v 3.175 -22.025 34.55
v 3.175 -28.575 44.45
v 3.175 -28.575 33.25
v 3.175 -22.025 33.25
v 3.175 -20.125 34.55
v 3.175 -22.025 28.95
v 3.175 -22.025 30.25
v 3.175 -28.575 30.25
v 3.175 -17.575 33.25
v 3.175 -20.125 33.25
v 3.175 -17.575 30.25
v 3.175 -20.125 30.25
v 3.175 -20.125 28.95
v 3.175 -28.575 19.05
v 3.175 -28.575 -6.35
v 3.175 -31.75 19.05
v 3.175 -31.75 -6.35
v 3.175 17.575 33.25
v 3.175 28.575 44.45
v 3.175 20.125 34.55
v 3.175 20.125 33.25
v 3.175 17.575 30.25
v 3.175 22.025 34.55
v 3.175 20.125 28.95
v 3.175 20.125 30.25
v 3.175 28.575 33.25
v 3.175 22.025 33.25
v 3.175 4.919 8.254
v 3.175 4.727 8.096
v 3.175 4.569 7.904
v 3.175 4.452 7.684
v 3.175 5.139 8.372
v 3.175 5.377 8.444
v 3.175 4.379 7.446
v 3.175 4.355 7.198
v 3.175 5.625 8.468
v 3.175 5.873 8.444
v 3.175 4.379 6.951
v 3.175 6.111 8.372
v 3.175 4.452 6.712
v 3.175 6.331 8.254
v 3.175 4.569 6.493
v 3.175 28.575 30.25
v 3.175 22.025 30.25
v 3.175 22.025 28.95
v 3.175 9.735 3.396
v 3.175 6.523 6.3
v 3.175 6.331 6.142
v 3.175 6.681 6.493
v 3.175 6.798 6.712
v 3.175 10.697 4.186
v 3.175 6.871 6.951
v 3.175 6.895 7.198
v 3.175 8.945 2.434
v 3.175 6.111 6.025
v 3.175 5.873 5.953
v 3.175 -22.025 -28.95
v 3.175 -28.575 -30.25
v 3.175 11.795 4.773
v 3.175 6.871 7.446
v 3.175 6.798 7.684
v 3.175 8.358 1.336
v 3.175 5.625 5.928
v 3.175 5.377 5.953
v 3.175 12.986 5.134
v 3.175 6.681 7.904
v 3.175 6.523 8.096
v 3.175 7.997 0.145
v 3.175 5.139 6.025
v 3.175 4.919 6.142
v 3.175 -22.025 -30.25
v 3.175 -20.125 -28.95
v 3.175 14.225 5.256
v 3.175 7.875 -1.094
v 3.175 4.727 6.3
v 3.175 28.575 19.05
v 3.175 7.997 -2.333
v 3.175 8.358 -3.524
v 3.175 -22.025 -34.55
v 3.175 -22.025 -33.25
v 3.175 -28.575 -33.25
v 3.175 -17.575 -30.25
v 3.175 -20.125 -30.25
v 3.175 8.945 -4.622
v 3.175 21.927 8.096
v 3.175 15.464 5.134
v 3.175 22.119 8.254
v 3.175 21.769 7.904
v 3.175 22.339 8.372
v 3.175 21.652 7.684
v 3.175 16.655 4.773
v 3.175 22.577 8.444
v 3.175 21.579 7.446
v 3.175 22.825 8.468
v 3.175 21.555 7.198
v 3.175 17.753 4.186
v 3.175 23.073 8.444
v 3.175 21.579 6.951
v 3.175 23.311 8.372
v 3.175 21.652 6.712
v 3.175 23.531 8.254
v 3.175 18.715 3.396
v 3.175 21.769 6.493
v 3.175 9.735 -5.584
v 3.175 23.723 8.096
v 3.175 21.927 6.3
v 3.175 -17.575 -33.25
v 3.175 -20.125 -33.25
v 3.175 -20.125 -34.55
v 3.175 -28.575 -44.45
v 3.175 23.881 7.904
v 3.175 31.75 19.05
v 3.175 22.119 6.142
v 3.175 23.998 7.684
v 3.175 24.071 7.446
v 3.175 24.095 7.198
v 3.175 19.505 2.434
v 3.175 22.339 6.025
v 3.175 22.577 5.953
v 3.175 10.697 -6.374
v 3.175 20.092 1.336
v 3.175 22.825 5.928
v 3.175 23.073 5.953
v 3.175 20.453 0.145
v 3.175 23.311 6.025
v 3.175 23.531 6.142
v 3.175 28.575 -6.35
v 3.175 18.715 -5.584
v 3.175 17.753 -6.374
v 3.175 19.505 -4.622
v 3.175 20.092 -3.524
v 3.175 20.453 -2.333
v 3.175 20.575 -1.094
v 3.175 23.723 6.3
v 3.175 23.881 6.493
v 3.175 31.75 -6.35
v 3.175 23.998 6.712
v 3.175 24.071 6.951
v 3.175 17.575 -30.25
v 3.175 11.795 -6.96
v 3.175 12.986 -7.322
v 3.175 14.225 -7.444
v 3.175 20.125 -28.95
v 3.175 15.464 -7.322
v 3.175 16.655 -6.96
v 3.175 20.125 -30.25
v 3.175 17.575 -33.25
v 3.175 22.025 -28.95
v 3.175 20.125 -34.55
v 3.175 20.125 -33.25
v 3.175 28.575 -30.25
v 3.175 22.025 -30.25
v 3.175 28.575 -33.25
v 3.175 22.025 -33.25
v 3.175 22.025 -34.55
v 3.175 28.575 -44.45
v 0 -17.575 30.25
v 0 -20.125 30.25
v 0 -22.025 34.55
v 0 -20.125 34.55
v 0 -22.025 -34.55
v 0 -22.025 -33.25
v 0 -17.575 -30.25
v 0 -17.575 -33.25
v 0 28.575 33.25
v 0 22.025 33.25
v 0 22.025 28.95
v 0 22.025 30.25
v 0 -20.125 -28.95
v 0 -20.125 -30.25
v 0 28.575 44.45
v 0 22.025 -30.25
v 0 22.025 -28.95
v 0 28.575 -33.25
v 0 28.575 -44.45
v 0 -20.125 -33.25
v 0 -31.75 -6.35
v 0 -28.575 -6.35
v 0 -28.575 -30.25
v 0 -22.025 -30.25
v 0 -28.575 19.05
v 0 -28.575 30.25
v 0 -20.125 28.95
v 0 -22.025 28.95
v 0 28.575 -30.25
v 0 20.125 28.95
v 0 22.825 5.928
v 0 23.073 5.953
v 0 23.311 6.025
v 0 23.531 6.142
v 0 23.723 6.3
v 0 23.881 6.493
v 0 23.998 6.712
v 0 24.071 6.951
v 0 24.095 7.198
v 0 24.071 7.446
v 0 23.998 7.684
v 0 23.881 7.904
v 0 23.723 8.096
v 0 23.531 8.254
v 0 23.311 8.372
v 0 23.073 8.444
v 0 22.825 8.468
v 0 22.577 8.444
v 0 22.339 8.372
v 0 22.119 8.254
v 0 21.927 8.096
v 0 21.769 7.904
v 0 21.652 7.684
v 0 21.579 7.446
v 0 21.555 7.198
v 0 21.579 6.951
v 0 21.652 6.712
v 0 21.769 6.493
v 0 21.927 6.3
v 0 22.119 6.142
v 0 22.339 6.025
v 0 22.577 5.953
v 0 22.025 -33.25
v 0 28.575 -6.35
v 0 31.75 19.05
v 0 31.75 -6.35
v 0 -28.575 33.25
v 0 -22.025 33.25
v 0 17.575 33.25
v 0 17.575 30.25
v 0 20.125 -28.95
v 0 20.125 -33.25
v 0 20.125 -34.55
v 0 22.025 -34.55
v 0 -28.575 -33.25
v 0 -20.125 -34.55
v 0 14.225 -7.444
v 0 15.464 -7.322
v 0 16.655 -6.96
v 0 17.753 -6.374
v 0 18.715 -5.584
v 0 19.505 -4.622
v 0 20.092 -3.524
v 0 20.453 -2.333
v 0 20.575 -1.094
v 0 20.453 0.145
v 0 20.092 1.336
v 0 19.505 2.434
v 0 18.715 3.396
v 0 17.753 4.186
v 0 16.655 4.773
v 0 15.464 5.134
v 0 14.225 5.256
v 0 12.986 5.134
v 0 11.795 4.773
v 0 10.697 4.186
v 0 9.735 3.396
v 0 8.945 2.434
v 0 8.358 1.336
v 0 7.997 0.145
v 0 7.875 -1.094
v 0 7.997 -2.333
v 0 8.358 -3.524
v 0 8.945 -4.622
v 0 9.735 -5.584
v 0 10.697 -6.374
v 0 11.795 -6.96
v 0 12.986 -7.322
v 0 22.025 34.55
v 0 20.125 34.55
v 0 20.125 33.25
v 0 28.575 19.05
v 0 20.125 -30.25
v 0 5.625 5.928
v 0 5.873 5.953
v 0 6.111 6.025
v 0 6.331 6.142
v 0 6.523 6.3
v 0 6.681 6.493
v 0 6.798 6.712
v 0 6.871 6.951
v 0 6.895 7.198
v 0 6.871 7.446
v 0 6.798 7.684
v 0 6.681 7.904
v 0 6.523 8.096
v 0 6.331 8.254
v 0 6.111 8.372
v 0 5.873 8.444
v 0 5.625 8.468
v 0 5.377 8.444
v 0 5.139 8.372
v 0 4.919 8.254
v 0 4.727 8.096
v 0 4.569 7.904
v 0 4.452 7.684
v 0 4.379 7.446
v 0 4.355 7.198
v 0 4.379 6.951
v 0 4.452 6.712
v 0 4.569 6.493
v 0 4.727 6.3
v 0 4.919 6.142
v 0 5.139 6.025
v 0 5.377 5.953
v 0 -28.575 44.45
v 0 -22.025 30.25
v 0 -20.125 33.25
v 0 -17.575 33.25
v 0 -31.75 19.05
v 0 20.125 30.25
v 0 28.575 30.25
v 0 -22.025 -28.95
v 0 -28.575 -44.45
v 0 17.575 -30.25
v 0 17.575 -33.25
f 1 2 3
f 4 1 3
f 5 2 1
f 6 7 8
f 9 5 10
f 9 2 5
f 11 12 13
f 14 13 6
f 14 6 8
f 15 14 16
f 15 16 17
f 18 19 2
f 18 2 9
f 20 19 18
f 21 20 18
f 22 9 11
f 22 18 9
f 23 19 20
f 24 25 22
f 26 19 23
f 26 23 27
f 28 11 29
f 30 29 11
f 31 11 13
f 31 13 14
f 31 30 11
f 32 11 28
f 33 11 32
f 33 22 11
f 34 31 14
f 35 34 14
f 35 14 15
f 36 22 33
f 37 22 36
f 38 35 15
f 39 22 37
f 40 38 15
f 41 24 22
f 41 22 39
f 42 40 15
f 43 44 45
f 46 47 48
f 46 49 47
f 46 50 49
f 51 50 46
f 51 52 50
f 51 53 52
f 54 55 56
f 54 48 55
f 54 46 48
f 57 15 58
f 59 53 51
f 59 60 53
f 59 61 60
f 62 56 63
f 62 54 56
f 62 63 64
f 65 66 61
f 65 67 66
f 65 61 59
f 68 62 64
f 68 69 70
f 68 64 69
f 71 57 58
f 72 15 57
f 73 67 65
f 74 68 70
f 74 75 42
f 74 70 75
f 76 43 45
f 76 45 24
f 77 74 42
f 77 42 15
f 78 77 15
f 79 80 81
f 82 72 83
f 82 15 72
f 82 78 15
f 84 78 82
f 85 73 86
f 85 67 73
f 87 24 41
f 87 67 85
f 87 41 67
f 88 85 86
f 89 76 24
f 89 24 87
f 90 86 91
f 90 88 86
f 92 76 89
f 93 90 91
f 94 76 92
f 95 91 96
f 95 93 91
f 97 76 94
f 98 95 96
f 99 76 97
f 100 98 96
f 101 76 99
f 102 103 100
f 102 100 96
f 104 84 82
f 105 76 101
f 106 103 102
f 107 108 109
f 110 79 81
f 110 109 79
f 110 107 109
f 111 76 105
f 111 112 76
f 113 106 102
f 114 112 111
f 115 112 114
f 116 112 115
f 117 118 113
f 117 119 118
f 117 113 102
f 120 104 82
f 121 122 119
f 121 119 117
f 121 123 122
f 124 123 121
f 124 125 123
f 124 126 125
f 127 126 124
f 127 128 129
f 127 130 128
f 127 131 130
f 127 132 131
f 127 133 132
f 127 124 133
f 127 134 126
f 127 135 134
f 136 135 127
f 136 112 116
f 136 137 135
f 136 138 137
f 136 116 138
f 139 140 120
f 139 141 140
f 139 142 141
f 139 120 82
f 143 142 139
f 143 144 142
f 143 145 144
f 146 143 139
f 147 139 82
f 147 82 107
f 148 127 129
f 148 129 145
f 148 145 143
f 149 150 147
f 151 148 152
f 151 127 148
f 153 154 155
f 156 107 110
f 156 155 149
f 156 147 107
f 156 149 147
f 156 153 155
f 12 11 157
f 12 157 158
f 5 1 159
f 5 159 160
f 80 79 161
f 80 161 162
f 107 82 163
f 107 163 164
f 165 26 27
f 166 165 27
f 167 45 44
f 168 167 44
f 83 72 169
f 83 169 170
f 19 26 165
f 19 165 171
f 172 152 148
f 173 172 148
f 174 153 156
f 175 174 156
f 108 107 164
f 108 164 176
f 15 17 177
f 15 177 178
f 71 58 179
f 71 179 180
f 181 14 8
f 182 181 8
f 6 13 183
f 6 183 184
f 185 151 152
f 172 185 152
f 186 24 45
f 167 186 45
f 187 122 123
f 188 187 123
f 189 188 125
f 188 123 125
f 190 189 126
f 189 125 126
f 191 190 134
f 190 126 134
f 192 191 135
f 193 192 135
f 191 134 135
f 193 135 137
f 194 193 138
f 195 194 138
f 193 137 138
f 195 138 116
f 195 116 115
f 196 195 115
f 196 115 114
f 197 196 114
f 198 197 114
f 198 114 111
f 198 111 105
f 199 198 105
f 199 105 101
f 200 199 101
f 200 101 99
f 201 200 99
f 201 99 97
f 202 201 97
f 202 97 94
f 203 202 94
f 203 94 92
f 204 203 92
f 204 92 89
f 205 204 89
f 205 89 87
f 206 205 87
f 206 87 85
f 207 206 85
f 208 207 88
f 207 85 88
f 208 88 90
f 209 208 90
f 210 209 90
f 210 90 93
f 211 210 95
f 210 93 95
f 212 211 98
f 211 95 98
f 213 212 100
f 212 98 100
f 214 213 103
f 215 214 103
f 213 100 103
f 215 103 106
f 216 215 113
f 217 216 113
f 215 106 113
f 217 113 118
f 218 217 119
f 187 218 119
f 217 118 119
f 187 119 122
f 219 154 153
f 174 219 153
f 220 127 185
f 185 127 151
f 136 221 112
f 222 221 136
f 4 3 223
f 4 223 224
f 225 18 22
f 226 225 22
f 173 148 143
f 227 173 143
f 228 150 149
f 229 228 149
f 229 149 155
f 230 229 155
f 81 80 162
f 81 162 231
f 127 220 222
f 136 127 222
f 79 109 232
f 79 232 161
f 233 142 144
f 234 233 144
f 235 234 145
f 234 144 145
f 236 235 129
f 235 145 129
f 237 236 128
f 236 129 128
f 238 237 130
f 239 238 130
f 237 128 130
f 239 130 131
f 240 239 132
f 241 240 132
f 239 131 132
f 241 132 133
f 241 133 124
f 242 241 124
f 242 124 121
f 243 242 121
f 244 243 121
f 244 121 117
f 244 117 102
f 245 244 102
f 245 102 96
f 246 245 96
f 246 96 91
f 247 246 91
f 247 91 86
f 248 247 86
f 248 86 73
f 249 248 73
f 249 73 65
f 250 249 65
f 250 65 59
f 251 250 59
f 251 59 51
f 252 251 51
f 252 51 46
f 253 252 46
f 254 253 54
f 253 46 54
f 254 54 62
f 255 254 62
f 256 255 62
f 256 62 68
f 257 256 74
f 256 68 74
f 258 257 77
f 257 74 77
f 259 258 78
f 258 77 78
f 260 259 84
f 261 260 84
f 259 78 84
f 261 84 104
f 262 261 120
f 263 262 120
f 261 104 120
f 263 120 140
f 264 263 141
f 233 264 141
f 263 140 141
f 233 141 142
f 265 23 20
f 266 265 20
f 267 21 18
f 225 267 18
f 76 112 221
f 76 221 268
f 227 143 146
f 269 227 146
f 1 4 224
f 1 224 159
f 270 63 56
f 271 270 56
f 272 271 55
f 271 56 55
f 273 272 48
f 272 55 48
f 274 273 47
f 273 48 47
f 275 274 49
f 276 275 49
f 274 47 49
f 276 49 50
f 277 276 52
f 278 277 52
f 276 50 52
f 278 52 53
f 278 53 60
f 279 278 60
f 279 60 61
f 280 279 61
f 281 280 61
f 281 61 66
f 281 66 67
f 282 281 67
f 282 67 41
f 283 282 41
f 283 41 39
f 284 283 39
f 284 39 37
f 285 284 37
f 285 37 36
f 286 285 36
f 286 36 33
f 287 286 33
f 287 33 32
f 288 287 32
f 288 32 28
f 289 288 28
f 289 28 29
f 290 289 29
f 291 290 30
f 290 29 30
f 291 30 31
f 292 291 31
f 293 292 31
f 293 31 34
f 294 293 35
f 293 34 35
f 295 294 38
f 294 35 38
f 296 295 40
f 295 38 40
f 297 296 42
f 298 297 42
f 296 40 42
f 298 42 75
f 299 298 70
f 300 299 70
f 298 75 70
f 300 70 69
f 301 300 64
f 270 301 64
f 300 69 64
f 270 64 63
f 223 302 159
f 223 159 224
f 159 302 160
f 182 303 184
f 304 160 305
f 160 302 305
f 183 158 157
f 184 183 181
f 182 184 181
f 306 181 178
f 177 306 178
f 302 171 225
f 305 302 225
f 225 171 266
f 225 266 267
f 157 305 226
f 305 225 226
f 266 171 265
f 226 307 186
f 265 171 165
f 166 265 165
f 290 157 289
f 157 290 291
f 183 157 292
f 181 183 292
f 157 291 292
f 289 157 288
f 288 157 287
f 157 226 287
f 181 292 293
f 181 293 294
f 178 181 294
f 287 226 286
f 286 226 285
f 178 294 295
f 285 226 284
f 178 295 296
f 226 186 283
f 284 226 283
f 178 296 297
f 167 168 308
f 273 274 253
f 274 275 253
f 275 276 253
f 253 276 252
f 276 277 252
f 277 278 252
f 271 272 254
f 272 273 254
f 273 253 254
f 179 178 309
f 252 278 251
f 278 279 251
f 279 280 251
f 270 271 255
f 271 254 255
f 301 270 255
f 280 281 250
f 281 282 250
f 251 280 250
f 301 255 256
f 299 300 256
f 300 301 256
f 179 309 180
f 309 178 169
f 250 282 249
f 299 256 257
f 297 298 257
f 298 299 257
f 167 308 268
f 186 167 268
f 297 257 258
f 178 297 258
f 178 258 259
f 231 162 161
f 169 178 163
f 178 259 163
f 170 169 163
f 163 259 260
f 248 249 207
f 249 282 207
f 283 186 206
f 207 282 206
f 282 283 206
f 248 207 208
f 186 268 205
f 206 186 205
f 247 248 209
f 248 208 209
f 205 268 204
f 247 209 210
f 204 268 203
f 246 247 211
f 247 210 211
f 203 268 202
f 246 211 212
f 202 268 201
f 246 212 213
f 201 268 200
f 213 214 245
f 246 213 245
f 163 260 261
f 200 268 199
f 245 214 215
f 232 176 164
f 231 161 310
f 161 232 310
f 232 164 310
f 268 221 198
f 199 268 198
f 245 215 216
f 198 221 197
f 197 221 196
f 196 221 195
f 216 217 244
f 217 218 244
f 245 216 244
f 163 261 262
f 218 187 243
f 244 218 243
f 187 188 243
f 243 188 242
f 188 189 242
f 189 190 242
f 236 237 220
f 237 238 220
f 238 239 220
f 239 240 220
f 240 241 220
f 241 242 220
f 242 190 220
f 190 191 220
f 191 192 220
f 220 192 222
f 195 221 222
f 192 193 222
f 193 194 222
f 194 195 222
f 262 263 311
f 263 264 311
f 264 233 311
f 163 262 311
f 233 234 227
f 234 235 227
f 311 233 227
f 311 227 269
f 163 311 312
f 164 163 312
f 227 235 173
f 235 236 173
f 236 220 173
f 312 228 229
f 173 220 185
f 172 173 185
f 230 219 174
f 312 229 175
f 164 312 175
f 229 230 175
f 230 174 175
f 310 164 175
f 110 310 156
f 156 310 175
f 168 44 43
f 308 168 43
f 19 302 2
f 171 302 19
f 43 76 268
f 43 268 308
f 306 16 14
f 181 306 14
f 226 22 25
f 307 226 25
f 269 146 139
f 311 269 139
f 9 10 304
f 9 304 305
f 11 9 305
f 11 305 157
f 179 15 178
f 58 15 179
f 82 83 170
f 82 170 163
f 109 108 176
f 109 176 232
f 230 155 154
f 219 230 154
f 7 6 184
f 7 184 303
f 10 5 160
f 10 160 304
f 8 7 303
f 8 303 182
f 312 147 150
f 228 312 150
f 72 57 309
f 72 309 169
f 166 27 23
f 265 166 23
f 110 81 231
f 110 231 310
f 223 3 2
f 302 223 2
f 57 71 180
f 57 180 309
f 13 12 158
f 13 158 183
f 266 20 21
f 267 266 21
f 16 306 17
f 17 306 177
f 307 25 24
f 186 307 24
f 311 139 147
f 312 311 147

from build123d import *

# Parameters (mm, degrees)
SKETCH1_W           = 88.9
SKETCH1_H           = 63.5
BOSS_EXTRUDE1_DEPTH = 3.175
SKETCH2_W           = 38.1
SKETCH2_H           = 3.175
CUT_EXTRUDE1_DEPTH  = 55.716959208
CUT_EXTRUDE2_DEPTH  = 55.716959208
SKETCH4_R           = 6.35
SKETCH4_R_2         = 1.27
CUT_EXTRUDE3_DEPTH  = 55.716959208


with BuildPart() as part:
    # Sketch1 → Boss-Extrude1 (new body)
    with BuildSketch(Plane(origin=(0, 0, 0), x_dir=(0, 0, -1), z_dir=(1, 0, 0))):
        Rectangle(SKETCH1_W, SKETCH1_H)
    extrude(amount=BOSS_EXTRUDE1_DEPTH)

    # Sketch2 → Cut-Extrude1 (cut, through all)
    with BuildSketch(Plane(origin=(3.175, 0, 0), x_dir=(0, 0, -1), z_dir=(1, 0, 0))):
        with Locations((25.4, -30.1625)):
            Rectangle(SKETCH2_W, SKETCH2_H)
        Polygon((-19.05, 28.575), (-44.45, 28.575), (-44.45, 31.75), (-41.275, 31.75), (-19.05, 31.75), align=None)
        Polygon((-44.45, -31.75), (-41.275, -31.75), (-19.05, -31.75), (-19.05, -28.575), (-44.45, -28.575), align=None)
        with Locations((25.4, 30.1625)):
            Rectangle(SKETCH2_W, SKETCH2_H)
    extrude(amount=-CUT_EXTRUDE1_DEPTH, mode=Mode.SUBTRACT)

    # Sketch3 → Cut-Extrude2 (cut, through all)
    with BuildSketch(Plane(origin=(3.175, 0, 0), x_dir=(0, 0, -1), z_dir=(1, 0, 0))):
        Polygon((-30.25, -17.575), (-30.25, -20.125), (-28.95, -20.125), (-28.95, -22.025), (-30.25, -22.025), (-30.25, -28.575), (-33.25, -28.575), (-33.25, -22.025), (-34.55, -22.025), (-34.55, -20.125), (-33.25, -20.125), (-33.25, -17.575), align=None)
        Polygon((33.25, -17.575), (33.25, -20.125), (34.55, -20.125), (34.55, -22.025), (33.25, -22.025), (33.25, -28.575), (30.25, -28.575), (30.25, -22.025), (28.95, -22.025), (28.95, -20.125), (30.25, -20.125), (30.25, -17.575), align=None)
        Polygon((33.25, 20.125), (34.55, 20.125), (34.55, 22.025), (33.25, 22.025), (33.25, 28.575), (30.25, 28.575), (30.25, 22.025), (28.95, 22.025), (28.95, 20.125), (30.25, 20.125), (30.25, 17.575), (33.25, 17.575), align=None)
        Polygon((-30.25, 20.125), (-28.95, 20.125), (-28.95, 22.025), (-30.25, 22.025), (-30.25, 28.575), (-33.25, 28.575), (-33.25, 22.025), (-34.55, 22.025), (-34.55, 20.125), (-33.25, 20.125), (-33.25, 17.575), (-30.25, 17.575), align=None)
    extrude(amount=-CUT_EXTRUDE2_DEPTH, mode=Mode.SUBTRACT)

    # Sketch4 → Cut-Extrude3 (cut, through all)
    with BuildSketch(Plane(origin=(3.175, 0, 0), x_dir=(0, 0, -1), z_dir=(1, 0, 0))):
        with Locations((1.09372, 14.225)):
            Circle(SKETCH4_R)
        with Locations((-7.198382525, 5.625)):
            Circle(SKETCH4_R_2)
        with Locations((-7.198382525, 22.825)):
            Circle(SKETCH4_R_2)
    extrude(amount=-CUT_EXTRUDE3_DEPTH, mode=Mode.SUBTRACT)


solid = part.part
